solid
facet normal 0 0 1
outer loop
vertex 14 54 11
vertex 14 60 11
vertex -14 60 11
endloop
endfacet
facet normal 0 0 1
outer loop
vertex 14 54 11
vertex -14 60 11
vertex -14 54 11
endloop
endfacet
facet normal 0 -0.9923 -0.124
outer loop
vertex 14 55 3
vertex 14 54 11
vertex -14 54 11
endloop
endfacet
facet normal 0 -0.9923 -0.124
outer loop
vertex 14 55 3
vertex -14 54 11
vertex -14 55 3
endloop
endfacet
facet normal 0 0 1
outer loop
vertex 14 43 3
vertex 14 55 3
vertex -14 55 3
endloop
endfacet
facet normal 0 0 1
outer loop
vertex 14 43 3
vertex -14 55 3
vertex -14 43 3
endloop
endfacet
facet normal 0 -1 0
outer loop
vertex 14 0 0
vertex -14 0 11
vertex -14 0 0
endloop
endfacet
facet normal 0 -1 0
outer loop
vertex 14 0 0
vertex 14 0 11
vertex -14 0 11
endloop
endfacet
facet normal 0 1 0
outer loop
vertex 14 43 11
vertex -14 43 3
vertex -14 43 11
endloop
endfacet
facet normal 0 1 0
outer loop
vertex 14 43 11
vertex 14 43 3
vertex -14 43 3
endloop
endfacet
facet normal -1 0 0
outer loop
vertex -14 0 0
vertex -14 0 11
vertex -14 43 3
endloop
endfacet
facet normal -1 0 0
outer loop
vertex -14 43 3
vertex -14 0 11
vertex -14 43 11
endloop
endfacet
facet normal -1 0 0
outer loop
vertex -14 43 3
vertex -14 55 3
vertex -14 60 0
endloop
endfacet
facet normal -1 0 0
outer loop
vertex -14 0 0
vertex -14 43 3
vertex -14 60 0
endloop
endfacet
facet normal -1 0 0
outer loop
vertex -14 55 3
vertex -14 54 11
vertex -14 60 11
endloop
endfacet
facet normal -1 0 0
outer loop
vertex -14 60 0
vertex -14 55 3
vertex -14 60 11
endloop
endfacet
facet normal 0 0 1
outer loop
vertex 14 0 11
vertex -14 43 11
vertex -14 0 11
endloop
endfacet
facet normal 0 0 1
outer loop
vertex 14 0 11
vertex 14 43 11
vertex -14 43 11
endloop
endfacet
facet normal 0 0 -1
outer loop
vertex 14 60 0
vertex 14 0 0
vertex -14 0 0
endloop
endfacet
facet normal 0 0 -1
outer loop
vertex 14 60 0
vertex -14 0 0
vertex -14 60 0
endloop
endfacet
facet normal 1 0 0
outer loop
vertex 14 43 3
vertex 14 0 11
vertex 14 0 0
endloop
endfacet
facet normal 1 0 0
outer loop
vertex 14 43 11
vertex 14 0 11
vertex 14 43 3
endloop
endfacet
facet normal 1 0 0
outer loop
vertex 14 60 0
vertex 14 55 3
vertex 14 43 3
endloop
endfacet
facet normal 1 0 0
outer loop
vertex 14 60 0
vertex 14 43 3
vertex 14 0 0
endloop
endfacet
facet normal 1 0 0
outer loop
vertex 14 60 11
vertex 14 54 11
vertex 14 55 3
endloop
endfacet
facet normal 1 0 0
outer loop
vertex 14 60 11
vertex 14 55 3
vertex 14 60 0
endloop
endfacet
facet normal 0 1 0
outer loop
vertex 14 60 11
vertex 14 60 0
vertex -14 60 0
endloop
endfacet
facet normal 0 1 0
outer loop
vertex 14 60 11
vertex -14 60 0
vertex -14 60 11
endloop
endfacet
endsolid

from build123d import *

# Parameters (mm, degrees)
PAD_DEPTH = 14


with BuildPart() as part:
    # Sketch → Pad (new body, symmetric)
    with BuildSketch(Plane.YZ):
        Polygon((0, 11), (0, 0), (60, 0), (60, 11), (54, 11), (55, 3), (43, 3), (43, 11), align=None)
    extrude(amount=PAD_DEPTH, both=True)


solid = part.part
